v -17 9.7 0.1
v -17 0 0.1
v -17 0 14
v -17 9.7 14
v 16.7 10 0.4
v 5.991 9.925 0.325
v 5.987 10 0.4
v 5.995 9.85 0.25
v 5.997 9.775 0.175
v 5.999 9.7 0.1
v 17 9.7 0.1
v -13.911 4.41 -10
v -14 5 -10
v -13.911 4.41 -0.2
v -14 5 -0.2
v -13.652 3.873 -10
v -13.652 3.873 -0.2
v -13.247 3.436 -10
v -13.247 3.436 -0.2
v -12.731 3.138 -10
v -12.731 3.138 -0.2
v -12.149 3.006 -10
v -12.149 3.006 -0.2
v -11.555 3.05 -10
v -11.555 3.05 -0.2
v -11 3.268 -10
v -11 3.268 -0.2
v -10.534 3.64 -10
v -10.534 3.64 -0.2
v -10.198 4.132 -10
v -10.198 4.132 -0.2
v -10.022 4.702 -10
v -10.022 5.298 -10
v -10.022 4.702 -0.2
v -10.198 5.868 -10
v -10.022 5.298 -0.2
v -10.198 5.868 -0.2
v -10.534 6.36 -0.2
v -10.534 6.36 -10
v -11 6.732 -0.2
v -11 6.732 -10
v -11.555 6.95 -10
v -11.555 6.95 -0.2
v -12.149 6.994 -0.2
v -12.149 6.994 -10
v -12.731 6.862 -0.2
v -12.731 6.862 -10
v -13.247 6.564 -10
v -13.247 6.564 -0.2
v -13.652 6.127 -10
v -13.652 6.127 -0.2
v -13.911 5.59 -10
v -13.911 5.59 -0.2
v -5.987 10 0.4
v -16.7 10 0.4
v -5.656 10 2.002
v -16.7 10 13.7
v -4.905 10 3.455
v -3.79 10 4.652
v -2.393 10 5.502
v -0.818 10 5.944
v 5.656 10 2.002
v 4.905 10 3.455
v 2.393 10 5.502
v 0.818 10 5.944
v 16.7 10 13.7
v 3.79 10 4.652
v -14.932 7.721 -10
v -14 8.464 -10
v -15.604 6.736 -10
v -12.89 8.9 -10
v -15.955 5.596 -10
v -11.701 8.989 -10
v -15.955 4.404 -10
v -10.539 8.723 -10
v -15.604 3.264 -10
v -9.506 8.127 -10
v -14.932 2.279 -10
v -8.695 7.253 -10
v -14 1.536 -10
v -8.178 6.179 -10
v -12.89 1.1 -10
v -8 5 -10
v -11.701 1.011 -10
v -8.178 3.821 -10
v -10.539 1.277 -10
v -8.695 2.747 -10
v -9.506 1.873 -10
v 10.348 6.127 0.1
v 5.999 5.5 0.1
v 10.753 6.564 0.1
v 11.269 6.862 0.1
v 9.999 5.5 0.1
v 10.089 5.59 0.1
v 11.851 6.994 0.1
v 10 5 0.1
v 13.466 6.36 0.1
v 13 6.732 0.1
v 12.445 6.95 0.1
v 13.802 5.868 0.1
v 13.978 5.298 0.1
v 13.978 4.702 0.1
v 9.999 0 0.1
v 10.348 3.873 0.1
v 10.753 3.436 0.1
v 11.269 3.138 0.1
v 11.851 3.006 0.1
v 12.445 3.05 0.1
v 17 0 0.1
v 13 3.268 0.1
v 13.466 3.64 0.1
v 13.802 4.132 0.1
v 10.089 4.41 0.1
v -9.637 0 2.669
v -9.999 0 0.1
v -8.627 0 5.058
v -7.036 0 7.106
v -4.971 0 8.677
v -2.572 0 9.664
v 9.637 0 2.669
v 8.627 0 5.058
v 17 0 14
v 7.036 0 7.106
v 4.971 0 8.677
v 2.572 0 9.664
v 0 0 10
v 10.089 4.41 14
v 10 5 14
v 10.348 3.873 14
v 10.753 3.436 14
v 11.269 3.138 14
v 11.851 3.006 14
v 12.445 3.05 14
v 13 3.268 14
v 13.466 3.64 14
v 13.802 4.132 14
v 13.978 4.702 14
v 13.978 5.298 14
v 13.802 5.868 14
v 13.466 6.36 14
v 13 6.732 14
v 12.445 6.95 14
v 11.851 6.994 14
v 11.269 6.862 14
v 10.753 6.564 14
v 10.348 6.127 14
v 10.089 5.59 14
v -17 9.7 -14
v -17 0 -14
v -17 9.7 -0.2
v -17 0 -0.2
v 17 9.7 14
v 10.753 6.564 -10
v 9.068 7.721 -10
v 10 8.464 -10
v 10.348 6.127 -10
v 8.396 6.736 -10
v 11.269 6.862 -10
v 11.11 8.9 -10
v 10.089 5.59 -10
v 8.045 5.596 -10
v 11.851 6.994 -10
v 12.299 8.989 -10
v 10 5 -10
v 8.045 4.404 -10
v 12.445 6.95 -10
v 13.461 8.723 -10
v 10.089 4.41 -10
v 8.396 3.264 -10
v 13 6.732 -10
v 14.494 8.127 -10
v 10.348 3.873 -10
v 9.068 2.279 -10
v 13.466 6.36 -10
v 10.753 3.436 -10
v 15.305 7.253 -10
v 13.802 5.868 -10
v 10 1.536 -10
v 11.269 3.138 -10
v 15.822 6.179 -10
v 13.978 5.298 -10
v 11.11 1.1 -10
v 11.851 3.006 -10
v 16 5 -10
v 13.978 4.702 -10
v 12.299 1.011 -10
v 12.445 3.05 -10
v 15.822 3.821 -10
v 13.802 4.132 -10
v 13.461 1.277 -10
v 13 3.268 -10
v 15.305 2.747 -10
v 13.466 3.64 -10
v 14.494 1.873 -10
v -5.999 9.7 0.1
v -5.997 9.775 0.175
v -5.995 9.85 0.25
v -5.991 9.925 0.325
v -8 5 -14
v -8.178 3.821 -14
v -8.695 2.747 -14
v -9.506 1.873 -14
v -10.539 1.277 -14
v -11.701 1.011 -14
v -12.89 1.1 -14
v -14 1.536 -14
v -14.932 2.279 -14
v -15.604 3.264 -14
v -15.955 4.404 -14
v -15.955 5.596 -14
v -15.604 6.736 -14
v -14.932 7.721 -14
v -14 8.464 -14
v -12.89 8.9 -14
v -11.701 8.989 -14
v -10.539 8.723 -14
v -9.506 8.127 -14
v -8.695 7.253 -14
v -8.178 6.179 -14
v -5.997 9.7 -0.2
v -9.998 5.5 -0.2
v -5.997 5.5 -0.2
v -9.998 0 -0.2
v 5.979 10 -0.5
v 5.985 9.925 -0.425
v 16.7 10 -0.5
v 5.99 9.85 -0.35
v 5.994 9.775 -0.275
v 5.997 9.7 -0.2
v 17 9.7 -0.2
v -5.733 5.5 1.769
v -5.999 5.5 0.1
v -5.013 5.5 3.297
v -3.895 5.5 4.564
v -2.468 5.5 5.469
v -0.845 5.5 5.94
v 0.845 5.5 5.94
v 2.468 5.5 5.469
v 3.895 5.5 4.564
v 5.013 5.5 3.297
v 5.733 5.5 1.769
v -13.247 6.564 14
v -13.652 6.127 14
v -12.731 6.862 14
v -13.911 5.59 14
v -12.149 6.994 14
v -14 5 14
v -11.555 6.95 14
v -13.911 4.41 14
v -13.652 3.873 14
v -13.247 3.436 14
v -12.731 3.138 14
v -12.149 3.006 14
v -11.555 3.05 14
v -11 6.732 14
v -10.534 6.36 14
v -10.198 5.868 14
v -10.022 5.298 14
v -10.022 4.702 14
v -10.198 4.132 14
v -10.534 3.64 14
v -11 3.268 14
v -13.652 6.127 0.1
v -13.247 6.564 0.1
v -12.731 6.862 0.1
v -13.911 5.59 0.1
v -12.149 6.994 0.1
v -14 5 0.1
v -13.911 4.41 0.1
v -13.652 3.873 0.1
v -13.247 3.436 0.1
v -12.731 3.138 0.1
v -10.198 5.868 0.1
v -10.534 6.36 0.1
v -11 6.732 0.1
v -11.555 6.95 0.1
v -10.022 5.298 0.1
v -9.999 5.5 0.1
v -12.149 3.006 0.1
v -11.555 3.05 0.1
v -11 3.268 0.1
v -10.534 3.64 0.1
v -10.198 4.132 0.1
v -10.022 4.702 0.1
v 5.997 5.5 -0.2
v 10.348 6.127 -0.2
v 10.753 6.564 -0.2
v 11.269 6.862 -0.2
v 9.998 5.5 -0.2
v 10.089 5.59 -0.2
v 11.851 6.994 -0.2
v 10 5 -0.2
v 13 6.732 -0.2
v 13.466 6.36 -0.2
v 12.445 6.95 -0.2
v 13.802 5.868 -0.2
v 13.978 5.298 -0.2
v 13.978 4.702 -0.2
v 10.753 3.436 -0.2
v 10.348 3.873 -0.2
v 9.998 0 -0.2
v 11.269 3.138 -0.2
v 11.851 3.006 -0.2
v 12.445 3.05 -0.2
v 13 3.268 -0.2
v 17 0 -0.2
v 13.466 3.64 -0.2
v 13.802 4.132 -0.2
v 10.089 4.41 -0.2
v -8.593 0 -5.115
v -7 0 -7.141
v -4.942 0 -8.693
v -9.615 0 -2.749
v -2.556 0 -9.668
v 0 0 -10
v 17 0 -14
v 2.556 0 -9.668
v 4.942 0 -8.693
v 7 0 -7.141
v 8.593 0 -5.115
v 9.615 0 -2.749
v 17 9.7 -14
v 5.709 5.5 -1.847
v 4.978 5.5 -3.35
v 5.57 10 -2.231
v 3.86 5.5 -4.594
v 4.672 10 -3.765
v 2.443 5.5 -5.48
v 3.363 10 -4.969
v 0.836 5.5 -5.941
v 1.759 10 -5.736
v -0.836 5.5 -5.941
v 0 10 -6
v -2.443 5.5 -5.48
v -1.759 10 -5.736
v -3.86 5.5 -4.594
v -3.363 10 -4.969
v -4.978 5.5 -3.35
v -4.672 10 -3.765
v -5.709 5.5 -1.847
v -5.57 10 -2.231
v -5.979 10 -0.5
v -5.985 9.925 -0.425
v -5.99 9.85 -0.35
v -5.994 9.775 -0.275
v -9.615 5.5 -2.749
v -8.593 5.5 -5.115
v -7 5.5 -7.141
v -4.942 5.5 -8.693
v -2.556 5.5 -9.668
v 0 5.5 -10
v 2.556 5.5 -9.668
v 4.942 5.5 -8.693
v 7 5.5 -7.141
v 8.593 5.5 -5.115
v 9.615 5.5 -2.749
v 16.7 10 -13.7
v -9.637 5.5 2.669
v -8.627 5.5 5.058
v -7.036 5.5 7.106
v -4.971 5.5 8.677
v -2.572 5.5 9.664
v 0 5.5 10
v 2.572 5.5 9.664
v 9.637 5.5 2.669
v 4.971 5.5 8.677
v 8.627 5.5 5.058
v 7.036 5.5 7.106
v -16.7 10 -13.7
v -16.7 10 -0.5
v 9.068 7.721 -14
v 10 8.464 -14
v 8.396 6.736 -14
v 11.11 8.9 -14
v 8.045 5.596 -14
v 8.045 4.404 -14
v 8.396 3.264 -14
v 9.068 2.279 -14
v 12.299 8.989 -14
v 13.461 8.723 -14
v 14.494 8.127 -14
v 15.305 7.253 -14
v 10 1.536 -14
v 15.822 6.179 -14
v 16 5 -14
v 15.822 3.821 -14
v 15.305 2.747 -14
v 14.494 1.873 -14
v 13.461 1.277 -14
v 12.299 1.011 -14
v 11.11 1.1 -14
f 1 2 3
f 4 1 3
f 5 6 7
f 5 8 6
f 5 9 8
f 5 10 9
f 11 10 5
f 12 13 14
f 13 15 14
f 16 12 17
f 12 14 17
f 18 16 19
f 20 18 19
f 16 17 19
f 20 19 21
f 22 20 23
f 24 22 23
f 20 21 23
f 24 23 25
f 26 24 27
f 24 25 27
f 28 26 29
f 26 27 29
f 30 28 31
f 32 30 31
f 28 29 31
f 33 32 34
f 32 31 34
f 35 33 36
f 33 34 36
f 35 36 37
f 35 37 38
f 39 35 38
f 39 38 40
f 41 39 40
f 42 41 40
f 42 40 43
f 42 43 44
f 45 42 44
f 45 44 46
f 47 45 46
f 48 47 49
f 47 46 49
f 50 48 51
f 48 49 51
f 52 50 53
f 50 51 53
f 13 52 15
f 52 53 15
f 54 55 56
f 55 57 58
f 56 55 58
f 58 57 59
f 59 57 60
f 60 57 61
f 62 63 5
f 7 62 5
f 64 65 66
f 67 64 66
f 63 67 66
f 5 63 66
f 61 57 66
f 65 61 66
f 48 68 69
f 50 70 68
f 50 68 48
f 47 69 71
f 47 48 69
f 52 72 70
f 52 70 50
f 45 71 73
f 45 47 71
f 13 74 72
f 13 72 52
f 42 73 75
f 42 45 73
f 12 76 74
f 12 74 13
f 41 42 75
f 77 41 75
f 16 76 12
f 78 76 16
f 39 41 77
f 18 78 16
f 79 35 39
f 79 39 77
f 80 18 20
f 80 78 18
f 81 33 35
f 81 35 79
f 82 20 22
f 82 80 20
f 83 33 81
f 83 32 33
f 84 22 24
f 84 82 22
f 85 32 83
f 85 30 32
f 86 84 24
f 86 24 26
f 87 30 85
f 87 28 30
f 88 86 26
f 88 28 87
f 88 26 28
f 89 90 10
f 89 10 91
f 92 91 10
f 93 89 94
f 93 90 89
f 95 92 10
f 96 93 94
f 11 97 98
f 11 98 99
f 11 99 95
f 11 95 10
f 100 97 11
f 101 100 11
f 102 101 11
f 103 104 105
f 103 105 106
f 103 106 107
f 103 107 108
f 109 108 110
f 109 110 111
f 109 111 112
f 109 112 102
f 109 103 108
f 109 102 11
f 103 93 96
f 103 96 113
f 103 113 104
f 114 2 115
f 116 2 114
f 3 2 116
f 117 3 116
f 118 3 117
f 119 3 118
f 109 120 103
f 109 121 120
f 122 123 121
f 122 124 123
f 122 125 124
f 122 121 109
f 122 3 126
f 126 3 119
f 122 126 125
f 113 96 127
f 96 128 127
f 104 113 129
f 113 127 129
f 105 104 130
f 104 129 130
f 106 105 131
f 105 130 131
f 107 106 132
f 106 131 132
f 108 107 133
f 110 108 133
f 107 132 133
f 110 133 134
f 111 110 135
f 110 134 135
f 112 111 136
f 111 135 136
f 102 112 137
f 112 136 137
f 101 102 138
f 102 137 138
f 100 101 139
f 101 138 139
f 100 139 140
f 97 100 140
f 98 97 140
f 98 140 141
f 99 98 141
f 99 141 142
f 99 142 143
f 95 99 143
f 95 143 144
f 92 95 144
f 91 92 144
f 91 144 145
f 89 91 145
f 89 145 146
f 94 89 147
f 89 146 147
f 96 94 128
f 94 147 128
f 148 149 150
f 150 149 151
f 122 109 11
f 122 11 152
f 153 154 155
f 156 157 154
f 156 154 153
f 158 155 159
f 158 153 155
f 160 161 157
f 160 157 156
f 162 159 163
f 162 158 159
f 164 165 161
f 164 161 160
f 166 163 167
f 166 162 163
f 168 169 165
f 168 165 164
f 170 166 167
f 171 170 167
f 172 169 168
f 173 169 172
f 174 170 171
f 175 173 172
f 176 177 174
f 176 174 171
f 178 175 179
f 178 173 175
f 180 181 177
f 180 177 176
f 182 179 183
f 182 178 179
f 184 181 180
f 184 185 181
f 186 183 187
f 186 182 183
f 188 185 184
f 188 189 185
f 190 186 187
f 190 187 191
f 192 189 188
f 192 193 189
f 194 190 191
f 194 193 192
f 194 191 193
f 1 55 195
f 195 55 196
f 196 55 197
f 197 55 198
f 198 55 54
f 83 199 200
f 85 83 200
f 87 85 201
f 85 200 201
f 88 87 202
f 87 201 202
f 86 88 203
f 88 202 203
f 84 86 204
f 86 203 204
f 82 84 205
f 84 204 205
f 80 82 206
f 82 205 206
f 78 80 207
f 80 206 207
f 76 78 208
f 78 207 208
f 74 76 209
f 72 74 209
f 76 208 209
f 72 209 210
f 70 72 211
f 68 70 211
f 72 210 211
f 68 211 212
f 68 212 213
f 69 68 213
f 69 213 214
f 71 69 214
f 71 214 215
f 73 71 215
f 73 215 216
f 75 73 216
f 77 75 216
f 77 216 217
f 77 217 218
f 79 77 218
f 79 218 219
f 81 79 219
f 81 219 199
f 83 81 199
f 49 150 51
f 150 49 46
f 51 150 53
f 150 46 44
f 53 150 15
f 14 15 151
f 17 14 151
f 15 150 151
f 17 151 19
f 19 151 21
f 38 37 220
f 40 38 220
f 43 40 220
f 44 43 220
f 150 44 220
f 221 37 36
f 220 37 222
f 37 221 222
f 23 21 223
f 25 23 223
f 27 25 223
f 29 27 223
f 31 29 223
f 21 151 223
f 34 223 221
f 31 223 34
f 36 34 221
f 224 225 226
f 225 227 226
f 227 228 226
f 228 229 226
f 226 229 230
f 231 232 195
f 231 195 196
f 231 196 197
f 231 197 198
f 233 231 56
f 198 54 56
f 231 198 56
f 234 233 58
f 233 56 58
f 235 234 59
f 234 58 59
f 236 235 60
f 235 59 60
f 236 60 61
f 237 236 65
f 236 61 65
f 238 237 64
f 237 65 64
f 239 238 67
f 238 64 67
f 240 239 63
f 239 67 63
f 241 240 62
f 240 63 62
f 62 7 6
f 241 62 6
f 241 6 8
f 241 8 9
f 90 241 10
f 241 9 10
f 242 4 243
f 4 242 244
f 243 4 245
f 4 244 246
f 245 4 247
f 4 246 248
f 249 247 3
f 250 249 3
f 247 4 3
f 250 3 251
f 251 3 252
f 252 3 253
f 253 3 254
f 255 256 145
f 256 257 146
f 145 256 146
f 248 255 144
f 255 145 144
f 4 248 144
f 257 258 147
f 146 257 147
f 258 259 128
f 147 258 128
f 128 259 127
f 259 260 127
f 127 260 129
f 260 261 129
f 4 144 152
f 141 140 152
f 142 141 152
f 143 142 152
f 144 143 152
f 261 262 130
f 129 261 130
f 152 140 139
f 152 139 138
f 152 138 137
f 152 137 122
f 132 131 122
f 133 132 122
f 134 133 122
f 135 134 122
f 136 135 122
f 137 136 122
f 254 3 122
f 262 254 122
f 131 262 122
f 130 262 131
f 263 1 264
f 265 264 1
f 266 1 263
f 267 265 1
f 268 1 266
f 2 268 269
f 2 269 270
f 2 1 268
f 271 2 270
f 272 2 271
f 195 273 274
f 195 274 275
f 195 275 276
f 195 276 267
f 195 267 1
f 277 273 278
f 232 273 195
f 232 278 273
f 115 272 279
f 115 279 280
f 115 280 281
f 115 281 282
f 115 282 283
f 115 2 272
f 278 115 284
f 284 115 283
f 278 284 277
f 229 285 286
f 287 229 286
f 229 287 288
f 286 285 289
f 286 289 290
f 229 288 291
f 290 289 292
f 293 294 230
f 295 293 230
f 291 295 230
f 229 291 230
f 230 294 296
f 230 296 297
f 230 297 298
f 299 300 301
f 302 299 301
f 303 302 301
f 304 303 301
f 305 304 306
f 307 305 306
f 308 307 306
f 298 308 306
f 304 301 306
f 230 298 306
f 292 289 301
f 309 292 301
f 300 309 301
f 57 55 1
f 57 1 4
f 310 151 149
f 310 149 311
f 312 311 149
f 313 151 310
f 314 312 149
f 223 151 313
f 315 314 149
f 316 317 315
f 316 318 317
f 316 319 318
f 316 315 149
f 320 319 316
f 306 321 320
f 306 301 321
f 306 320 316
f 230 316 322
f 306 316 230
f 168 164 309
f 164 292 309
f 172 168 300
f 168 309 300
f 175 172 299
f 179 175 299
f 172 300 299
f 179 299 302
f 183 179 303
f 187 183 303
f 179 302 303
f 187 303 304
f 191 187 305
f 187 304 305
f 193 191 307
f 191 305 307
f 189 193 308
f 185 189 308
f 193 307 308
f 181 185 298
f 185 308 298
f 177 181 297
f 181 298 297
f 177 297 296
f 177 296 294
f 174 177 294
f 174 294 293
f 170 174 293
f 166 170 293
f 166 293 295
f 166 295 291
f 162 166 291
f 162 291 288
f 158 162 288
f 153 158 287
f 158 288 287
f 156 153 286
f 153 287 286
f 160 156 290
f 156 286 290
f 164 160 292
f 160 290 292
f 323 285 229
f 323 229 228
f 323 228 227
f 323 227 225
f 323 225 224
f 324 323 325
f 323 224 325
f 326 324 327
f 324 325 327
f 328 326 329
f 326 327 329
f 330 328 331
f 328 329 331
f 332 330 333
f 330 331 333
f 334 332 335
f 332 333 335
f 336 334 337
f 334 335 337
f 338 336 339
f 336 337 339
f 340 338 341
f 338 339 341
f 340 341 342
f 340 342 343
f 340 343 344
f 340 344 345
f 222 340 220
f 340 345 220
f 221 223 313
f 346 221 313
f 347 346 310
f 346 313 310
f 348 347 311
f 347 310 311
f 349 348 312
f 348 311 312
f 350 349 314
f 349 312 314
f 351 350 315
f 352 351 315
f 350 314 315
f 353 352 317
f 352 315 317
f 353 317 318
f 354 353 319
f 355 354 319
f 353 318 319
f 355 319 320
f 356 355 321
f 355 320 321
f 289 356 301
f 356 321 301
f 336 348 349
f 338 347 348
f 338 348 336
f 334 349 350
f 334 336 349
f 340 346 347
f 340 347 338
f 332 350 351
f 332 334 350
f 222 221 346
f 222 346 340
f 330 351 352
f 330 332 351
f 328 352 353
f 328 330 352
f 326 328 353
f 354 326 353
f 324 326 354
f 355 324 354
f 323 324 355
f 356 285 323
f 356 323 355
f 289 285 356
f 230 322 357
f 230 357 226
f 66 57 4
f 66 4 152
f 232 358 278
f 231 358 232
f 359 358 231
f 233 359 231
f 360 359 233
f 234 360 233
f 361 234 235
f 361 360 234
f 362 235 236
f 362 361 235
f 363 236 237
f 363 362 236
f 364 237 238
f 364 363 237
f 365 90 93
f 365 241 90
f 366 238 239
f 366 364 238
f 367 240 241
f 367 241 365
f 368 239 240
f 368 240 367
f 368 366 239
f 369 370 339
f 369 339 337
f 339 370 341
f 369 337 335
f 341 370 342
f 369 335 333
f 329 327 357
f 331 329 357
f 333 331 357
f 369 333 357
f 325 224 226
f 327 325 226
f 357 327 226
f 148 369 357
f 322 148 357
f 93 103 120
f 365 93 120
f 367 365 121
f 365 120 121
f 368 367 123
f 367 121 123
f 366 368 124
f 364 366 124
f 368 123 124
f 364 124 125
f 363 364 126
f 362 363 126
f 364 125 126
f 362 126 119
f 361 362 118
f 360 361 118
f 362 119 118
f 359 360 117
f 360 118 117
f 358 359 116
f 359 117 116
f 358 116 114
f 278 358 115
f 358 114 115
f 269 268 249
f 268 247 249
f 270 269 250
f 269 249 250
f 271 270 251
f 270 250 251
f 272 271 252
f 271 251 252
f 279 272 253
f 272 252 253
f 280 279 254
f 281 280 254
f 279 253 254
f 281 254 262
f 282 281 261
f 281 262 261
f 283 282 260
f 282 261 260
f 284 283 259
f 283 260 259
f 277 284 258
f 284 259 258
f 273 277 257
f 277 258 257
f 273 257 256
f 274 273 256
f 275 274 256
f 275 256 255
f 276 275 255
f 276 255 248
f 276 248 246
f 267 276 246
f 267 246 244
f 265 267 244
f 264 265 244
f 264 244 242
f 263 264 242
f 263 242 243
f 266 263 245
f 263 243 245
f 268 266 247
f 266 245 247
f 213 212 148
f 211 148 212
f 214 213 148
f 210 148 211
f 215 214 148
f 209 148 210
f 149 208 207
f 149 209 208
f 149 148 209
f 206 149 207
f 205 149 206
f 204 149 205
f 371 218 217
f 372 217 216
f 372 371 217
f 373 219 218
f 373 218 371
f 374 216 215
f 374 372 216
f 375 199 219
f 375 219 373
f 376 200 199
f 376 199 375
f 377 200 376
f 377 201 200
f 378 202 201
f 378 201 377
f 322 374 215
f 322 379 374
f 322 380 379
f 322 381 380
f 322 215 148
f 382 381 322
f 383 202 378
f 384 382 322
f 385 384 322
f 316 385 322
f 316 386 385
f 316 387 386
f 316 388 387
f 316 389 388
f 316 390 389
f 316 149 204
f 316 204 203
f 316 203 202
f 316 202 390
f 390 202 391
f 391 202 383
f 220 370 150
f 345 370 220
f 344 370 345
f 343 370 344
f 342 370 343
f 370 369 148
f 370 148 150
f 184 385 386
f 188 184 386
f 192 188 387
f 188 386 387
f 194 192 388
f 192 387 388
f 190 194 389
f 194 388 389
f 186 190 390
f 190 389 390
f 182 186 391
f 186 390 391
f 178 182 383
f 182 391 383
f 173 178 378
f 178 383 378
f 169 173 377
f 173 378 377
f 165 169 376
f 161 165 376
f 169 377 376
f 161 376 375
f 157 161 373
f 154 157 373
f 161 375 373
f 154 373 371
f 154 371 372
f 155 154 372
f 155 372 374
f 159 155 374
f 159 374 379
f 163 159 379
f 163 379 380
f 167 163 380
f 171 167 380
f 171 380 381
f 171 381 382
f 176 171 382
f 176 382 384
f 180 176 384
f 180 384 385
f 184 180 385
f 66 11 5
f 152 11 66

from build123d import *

# Parameters (mm, degrees)
F0_W             = 34
F0_H             = 13.9
F1_DEPTH         = 10
F0_H_2           = 13.8
F2_D             = 12
F2_CBORE_D       = 20
F2_CBORE_DEPTH   = 5.5
F2_2_D           = 12
F2_2_CBORE_D     = 20
F2_2_CBORE_DEPTH = 5.5
F4_D             = 4
F4_CBORE_D       = 8
F4_CBORE_DEPTH   = 4
F4_2_D           = 4
F4_2_CBORE_D     = 8
F4_2_CBORE_DEPTH = 4
F5_SIZE          = 0.3
F5_2_SIZE        = 0.3


# Not quite as in the source:
# - a feature names something its author has since deleted; it is built from what else it names


with BuildPart() as f1:
    # F0 (on Front) → F1 (new body)
    with BuildSketch(Plane.XZ):
        with Locations((0, 7.05)):
            Rectangle(F0_W, F0_H)
    extrude(amount=-F1_DEPTH)

    # F2 (through all)
    with Locations(Plane.XZ):
        with Locations((0, 0)):
            CounterBoreHole(F2_D / 2, F2_CBORE_D / 2, F2_CBORE_DEPTH)

    # F4 (through all)
    with Locations(Plane(origin=(0, 0, -14), x_dir=(1, 0, 0), z_dir=(0, 0, -1))):
        with Locations((-12, -5), (12, -5)):
            CounterBoreHole(F4_D / 2, F4_CBORE_D / 2, F4_CBORE_DEPTH)

    # F5
    f5_edges = [f1.edges().sort_by_distance(p)[0] for p in [
        (0, 10, 14),
        (-17, 10, 7.05),
        (17, 10, 7.05),
        (11.499583, 10, 0.1),
        (-11.499583, 10, 0.1),
    ]]
    chamfer(f5_edges, length=F5_SIZE)


with BuildPart() as f1b:
    # F0 (on Front) → F1, piece 2 (new body)
    with BuildSketch(Plane.XZ):
        with Locations((0, -7.1)):
            Rectangle(F0_W, F0_H_2)
    extrude(amount=-F1_DEPTH)

    # F2#2 (through all)
    with Locations(Plane.XZ):
        with Locations((0, 0)):
            CounterBoreHole(F2_2_D / 2, F2_2_CBORE_D / 2, F2_2_CBORE_DEPTH)

    # F4#2 (through all)
    with Locations(Plane(origin=(0, 0, -14), x_dir=(1, 0, 0), z_dir=(0, 0, -1))):
        with Locations((-12, -5), (12, -5)):
            CounterBoreHole(F4_2_D / 2, F4_2_CBORE_D / 2, F4_2_CBORE_DEPTH)

    # F5#2
    f5_2_edges = [f1b.edges().sort_by_distance(p)[0] for p in [
        (-17, 10, -7.1),
        (17, 10, -7.1),
        (0, 10, -14),
        (11.498333, 10, -0.2),
        (-11.498333, 10, -0.2),
    ]]
    chamfer(f5_2_edges, length=F5_2_SIZE)


solid = Compound([f1.part, f1b.part])
